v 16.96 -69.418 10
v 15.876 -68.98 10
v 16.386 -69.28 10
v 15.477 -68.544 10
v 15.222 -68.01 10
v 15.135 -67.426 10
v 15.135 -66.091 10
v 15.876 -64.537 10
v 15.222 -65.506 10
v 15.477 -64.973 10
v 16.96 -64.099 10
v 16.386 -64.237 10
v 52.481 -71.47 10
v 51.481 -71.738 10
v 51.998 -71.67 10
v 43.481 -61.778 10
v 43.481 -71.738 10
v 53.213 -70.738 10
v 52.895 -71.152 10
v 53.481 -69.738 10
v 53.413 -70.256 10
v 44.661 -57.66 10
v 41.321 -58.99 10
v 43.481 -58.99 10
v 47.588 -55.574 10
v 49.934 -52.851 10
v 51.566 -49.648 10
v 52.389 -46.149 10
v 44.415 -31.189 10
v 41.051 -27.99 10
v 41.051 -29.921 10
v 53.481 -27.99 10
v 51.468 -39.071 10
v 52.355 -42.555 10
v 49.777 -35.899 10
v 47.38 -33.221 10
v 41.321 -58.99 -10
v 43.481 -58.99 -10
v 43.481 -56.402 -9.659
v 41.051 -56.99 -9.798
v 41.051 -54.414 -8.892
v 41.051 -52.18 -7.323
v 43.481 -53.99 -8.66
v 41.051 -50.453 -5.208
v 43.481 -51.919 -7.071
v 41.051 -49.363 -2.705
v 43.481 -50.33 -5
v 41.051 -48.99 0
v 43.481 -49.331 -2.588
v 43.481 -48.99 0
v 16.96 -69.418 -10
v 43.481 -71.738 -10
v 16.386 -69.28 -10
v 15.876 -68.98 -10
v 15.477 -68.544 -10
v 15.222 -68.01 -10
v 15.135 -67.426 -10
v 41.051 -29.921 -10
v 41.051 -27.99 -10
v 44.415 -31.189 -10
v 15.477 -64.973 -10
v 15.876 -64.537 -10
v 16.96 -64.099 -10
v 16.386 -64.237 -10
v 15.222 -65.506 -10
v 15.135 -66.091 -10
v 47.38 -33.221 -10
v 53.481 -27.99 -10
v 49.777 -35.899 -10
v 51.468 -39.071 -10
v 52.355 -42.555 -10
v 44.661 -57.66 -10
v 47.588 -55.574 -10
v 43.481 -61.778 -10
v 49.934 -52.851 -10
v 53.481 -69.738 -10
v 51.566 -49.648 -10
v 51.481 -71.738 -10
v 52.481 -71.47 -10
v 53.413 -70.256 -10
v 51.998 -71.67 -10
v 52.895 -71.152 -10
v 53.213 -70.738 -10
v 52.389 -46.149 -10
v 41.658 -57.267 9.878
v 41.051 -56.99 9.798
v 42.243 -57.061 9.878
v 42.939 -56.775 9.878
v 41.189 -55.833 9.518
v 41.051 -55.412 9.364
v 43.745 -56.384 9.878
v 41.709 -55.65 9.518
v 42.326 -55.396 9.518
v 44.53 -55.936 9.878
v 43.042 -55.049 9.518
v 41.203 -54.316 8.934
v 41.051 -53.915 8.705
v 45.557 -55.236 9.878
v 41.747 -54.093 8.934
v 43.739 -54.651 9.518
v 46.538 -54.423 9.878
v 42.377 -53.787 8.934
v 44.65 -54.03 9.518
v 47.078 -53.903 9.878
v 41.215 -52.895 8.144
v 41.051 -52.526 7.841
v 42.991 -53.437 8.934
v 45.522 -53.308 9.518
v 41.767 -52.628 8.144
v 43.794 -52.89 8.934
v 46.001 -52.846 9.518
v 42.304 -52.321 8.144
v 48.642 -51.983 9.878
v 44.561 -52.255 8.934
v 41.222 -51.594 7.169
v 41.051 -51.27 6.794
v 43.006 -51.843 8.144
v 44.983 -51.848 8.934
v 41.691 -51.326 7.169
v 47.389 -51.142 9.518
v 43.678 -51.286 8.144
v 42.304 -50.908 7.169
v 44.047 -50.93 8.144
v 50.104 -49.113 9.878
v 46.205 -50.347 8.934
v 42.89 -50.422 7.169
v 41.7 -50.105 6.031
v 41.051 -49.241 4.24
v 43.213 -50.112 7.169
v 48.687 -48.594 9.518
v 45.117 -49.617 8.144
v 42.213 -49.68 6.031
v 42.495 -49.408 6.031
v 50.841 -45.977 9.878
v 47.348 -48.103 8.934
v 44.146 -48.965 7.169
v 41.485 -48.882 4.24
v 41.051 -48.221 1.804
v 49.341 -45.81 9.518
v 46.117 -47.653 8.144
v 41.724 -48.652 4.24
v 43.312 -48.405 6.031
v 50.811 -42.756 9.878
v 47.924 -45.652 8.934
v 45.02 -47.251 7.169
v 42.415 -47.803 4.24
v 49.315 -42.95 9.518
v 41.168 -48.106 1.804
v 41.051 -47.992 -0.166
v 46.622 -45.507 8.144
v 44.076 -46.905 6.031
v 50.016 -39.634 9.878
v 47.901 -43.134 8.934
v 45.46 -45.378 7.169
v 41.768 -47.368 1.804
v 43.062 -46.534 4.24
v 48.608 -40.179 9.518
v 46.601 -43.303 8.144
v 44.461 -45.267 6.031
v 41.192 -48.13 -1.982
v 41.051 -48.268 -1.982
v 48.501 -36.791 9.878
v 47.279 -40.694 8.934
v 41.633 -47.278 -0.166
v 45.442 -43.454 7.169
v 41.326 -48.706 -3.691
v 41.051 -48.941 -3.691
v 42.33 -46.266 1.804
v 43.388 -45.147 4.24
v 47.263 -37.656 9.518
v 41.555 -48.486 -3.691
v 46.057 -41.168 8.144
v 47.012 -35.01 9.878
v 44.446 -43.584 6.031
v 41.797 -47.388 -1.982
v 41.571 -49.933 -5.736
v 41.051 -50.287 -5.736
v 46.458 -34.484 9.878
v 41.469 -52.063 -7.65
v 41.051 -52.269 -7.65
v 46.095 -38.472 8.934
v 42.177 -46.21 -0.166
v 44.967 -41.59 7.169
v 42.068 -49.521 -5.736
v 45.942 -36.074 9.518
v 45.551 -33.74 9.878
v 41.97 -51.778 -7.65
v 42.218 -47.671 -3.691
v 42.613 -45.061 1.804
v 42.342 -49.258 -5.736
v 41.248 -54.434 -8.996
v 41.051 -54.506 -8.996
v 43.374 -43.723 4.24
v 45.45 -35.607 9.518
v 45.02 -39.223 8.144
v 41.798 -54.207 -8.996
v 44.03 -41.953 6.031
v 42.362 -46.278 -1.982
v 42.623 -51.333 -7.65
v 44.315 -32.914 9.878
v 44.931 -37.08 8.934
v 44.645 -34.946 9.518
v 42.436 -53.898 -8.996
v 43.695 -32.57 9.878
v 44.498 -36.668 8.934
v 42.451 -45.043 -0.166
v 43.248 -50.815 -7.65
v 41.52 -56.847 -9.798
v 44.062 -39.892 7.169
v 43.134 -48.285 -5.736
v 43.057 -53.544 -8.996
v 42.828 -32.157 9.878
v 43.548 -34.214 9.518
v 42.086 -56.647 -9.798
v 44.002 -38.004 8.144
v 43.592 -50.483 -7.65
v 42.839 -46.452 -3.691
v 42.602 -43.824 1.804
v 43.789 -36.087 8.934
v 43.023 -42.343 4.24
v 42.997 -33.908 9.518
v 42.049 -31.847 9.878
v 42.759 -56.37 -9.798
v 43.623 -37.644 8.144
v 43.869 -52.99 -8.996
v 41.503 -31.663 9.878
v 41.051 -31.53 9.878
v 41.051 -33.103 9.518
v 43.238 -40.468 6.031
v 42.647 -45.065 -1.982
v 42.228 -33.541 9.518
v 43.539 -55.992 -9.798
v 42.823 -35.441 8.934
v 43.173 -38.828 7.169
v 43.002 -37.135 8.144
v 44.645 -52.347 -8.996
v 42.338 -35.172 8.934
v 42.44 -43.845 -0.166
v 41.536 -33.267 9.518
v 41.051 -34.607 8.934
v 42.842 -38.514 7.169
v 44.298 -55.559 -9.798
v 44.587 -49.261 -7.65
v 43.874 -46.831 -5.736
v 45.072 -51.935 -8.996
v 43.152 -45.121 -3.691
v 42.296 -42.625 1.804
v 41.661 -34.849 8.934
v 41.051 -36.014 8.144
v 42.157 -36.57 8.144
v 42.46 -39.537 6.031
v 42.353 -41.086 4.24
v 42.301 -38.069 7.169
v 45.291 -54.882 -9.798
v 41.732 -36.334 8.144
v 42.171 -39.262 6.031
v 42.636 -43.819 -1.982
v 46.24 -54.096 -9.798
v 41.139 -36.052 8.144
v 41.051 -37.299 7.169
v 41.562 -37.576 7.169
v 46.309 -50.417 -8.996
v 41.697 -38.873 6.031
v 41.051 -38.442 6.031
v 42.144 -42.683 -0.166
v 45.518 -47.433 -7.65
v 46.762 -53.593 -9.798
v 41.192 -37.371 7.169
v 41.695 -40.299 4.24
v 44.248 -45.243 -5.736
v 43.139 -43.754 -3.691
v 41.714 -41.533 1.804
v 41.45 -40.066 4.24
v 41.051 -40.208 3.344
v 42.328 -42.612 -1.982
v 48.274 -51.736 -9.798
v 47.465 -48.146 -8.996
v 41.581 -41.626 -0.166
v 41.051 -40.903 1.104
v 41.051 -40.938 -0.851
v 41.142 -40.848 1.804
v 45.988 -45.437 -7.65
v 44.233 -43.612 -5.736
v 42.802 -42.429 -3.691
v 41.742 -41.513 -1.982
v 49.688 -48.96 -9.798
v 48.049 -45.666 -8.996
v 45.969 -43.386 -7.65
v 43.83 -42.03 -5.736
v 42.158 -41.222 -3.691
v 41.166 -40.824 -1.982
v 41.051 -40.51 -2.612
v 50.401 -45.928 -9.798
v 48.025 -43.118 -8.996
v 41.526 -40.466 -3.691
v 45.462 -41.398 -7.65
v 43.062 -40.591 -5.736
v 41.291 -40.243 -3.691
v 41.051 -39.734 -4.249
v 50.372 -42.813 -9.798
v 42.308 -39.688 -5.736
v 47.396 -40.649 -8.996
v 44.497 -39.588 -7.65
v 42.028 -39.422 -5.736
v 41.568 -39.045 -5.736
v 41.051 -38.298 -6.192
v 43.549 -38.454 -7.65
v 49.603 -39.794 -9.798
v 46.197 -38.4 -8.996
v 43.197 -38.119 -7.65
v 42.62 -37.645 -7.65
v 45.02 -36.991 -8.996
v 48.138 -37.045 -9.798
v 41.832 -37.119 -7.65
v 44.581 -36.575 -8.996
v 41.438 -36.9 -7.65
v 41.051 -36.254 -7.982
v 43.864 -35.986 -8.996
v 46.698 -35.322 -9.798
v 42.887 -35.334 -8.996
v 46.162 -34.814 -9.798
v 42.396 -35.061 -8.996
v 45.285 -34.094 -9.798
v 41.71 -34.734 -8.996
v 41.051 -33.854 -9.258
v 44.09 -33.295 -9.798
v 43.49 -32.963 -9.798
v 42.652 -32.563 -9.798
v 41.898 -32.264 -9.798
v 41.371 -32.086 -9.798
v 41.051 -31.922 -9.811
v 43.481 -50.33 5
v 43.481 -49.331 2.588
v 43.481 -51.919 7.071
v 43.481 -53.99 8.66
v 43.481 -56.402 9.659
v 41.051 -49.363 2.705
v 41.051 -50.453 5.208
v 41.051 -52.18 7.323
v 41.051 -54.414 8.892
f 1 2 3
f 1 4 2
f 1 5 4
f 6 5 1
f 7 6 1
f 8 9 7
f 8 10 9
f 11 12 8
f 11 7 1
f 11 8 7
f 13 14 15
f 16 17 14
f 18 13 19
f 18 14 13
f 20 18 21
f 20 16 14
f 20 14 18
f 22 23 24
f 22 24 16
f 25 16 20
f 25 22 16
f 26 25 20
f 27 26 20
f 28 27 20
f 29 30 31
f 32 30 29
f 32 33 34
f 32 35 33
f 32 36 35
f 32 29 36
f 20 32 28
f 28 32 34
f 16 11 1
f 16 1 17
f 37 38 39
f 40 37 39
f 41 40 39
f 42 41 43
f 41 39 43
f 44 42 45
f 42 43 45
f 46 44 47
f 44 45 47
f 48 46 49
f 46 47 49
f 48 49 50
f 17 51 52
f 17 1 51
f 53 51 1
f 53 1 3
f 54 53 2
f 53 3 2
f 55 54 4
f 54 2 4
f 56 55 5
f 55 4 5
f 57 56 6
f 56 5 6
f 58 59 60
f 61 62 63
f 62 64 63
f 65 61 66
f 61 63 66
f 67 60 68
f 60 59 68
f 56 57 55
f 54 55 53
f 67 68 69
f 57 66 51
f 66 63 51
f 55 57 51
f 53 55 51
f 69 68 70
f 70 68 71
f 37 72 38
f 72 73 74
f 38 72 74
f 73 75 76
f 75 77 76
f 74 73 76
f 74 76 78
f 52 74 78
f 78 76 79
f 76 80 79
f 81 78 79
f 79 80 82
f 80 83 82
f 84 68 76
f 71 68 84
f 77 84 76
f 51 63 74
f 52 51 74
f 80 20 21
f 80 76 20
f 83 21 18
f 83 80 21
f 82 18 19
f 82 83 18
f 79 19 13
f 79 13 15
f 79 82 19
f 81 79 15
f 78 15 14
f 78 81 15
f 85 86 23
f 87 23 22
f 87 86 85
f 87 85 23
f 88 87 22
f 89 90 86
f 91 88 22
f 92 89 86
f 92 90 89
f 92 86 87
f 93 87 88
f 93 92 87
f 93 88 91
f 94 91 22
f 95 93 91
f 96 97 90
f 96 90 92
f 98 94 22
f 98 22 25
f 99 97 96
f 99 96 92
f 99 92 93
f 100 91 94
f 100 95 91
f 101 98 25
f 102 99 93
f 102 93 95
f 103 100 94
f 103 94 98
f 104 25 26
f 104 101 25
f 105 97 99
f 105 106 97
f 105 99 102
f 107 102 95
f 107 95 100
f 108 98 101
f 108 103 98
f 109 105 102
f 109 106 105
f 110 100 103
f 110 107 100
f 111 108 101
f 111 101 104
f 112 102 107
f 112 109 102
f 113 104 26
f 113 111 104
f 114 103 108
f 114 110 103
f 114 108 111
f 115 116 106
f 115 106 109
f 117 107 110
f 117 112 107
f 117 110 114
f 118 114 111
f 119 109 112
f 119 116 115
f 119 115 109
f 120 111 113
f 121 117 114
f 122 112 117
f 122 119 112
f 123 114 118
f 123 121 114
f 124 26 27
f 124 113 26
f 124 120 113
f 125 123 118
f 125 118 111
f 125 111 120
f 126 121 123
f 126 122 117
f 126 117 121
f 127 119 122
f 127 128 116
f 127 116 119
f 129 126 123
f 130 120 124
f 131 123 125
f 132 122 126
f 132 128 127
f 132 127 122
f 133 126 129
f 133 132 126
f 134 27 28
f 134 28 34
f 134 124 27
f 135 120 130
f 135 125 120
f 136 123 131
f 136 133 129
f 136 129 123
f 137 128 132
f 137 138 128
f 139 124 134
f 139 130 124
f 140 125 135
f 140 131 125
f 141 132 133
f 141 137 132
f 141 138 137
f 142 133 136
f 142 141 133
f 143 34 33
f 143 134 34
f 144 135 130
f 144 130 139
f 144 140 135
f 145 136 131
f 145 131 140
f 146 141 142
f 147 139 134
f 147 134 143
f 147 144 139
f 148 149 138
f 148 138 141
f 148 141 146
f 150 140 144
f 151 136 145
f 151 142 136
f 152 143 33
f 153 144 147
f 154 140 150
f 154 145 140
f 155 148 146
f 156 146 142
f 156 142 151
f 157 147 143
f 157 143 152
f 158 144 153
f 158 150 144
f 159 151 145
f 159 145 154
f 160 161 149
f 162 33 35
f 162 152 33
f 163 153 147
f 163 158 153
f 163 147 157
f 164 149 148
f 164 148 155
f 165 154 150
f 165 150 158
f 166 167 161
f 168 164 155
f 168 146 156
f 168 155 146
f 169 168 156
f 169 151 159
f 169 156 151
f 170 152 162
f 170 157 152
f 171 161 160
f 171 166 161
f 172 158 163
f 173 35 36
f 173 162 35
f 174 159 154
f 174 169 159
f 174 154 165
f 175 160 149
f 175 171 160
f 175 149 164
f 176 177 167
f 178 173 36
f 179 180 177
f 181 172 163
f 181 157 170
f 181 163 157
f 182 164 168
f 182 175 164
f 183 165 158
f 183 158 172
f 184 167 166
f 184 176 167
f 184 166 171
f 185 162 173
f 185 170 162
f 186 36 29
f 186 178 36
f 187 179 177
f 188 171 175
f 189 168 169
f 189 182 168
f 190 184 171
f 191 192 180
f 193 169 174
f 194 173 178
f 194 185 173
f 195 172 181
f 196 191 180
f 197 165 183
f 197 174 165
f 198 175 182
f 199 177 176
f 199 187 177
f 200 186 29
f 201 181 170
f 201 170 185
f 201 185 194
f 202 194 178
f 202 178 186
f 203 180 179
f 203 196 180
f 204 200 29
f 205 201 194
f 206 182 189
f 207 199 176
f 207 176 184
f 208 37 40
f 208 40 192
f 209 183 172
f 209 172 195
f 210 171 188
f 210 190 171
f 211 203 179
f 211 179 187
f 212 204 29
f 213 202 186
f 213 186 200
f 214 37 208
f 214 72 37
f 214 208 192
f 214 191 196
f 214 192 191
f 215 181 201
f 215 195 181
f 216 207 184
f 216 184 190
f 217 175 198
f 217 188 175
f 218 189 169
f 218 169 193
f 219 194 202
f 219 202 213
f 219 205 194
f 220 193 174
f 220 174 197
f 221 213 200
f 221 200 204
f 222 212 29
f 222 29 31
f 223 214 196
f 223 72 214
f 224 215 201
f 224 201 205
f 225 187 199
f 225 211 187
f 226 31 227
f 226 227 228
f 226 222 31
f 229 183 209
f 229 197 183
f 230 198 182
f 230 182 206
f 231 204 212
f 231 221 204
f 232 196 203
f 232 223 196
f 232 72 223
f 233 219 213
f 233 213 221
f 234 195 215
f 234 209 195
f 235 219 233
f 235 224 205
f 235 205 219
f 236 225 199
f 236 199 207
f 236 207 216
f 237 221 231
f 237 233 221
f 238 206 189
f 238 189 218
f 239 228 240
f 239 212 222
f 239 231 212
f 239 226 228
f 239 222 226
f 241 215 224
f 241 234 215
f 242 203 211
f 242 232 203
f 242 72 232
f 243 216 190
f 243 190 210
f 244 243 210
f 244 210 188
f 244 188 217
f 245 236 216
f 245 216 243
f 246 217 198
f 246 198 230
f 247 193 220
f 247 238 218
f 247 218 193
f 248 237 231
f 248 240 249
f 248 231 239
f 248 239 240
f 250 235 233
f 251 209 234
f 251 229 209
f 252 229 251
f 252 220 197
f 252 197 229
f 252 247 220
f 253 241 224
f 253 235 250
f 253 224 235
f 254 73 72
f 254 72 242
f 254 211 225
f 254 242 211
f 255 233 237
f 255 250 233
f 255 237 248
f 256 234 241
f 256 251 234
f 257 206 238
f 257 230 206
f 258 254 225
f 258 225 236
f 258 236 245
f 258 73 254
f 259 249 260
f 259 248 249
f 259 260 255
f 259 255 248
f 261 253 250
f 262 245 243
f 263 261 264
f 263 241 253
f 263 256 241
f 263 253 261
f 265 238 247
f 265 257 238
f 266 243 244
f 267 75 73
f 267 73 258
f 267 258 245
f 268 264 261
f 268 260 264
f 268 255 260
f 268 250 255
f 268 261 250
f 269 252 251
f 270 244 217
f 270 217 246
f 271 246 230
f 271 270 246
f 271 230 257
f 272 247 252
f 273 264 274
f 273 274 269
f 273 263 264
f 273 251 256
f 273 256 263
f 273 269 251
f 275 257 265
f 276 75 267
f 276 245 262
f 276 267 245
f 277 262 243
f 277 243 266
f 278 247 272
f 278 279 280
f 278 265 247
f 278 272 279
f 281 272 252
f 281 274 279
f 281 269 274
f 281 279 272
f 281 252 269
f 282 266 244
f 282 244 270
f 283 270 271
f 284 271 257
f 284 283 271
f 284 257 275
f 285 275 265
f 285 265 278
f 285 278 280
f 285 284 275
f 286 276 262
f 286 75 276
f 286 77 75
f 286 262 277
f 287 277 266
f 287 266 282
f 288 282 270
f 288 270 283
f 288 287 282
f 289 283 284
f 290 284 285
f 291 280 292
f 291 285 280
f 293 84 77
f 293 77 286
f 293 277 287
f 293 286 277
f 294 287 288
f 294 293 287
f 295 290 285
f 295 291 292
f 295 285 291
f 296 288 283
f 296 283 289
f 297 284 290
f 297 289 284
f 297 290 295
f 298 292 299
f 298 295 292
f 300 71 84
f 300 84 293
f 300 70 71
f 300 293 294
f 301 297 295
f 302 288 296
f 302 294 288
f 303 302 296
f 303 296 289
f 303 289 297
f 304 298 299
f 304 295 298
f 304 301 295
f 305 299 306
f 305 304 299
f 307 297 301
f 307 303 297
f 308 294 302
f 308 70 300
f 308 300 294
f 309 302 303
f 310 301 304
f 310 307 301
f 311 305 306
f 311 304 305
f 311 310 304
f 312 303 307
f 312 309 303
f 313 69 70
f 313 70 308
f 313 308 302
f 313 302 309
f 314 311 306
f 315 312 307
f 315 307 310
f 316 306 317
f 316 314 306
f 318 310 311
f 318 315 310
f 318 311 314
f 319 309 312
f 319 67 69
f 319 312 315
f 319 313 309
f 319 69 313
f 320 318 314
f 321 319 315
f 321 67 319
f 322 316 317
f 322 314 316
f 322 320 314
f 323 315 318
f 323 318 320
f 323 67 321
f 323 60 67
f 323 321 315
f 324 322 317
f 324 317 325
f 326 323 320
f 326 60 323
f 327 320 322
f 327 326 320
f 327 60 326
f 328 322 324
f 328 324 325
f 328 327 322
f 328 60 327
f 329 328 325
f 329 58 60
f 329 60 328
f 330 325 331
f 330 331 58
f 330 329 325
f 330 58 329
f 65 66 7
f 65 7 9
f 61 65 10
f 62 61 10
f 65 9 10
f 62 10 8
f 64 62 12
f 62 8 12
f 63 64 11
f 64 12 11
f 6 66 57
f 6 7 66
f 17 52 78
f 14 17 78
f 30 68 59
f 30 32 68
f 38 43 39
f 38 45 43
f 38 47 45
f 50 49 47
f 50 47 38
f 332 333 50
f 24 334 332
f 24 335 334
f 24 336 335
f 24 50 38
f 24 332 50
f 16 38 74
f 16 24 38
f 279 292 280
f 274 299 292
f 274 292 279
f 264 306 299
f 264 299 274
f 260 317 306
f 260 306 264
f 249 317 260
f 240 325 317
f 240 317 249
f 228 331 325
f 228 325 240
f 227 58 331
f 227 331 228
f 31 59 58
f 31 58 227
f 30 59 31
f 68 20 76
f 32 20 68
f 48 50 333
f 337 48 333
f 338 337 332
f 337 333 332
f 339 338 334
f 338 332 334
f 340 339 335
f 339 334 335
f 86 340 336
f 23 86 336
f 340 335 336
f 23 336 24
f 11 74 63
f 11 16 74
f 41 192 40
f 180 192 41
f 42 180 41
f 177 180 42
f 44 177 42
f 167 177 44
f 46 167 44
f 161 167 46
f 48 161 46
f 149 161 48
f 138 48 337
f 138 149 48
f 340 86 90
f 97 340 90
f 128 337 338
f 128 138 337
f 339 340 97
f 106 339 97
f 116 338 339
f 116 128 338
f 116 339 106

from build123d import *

# Parameters (mm, degrees)
BOSS_EXTRUDE1_DEPTH = 10
BOSS_EXTRUDE2_DEPTH = 2.429285786
FILLET2_R           = 2


with BuildPart() as part:
    # Sketch2 → Boss-Extrude1 (new, symmetric)
    with BuildSketch(Plane.XY):
        Polygon((41.051421481, -27.990049876), (41.051421481, -48.990049876), (43.480707267, -48.990049876), (43.480707267, -61.778339755), (15.134736917, -64.258290817), (15.134736917, -69.258290817), (43.480707267, -71.738241879), (53.480707267, -71.738241879), (53.480707267, -27.990049876), align=None)
    extrude(amount=BOSS_EXTRUDE1_DEPTH, both=True)

    # Sketch4 → Boss-Extrude2 (add)
    with BuildSketch(Plane.ZY.offset(-43.480707267)):
        with BuildLine():
            Line((-10, -48.990049876), (-10, -58.990049876))
            ThreePointArc((-10, -58.990049876), (-7.071067812, -51.918982064), (0, -48.990049876))
            Line((0, -48.990049876), (-10, -48.990049876))
        make_face()
        with BuildLine():
            Line((10, -48.990049876), (0, -48.990049876))
            ThreePointArc((0, -48.990049876), (7.071067812, -51.918982064), (10, -58.990049876))
            Line((10, -58.990049876), (10, -48.990049876))
        make_face()
    extrude(amount=BOSS_EXTRUDE2_DEPTH)

    # Sketch3 → Cut-Revolve1 (revolve, cut)
    with BuildSketch(Plane.ZY.offset(-37.480707267)):
        with BuildLine():
            Line((-10, -44.490049876), (10, -44.490049876))
            Line((10, -44.490049876), (10, -29.490049876))
            ThreePointArc((10, -29.490049876), (0, -39.490049876), (-10, -29.490049876))
            Line((-10, -29.490049876), (-10, -44.490049876))
        make_face()
    revolve(axis=Axis((37.480707267, -44.490049876, -10), (0, 0, 1)), mode=Mode.SUBTRACT)

    # Fillet2
    fillet2_edges = [part.edges().sort_by_distance(p)[0] for p in [
        (53.480707267, -71.738241879, 0),
        (15.134736917, -69.258290817, 0),
        (15.134736917, -64.258290817, 0),
    ]]
    fillet(fillet2_edges, radius=FILLET2_R)


solid = part.part
